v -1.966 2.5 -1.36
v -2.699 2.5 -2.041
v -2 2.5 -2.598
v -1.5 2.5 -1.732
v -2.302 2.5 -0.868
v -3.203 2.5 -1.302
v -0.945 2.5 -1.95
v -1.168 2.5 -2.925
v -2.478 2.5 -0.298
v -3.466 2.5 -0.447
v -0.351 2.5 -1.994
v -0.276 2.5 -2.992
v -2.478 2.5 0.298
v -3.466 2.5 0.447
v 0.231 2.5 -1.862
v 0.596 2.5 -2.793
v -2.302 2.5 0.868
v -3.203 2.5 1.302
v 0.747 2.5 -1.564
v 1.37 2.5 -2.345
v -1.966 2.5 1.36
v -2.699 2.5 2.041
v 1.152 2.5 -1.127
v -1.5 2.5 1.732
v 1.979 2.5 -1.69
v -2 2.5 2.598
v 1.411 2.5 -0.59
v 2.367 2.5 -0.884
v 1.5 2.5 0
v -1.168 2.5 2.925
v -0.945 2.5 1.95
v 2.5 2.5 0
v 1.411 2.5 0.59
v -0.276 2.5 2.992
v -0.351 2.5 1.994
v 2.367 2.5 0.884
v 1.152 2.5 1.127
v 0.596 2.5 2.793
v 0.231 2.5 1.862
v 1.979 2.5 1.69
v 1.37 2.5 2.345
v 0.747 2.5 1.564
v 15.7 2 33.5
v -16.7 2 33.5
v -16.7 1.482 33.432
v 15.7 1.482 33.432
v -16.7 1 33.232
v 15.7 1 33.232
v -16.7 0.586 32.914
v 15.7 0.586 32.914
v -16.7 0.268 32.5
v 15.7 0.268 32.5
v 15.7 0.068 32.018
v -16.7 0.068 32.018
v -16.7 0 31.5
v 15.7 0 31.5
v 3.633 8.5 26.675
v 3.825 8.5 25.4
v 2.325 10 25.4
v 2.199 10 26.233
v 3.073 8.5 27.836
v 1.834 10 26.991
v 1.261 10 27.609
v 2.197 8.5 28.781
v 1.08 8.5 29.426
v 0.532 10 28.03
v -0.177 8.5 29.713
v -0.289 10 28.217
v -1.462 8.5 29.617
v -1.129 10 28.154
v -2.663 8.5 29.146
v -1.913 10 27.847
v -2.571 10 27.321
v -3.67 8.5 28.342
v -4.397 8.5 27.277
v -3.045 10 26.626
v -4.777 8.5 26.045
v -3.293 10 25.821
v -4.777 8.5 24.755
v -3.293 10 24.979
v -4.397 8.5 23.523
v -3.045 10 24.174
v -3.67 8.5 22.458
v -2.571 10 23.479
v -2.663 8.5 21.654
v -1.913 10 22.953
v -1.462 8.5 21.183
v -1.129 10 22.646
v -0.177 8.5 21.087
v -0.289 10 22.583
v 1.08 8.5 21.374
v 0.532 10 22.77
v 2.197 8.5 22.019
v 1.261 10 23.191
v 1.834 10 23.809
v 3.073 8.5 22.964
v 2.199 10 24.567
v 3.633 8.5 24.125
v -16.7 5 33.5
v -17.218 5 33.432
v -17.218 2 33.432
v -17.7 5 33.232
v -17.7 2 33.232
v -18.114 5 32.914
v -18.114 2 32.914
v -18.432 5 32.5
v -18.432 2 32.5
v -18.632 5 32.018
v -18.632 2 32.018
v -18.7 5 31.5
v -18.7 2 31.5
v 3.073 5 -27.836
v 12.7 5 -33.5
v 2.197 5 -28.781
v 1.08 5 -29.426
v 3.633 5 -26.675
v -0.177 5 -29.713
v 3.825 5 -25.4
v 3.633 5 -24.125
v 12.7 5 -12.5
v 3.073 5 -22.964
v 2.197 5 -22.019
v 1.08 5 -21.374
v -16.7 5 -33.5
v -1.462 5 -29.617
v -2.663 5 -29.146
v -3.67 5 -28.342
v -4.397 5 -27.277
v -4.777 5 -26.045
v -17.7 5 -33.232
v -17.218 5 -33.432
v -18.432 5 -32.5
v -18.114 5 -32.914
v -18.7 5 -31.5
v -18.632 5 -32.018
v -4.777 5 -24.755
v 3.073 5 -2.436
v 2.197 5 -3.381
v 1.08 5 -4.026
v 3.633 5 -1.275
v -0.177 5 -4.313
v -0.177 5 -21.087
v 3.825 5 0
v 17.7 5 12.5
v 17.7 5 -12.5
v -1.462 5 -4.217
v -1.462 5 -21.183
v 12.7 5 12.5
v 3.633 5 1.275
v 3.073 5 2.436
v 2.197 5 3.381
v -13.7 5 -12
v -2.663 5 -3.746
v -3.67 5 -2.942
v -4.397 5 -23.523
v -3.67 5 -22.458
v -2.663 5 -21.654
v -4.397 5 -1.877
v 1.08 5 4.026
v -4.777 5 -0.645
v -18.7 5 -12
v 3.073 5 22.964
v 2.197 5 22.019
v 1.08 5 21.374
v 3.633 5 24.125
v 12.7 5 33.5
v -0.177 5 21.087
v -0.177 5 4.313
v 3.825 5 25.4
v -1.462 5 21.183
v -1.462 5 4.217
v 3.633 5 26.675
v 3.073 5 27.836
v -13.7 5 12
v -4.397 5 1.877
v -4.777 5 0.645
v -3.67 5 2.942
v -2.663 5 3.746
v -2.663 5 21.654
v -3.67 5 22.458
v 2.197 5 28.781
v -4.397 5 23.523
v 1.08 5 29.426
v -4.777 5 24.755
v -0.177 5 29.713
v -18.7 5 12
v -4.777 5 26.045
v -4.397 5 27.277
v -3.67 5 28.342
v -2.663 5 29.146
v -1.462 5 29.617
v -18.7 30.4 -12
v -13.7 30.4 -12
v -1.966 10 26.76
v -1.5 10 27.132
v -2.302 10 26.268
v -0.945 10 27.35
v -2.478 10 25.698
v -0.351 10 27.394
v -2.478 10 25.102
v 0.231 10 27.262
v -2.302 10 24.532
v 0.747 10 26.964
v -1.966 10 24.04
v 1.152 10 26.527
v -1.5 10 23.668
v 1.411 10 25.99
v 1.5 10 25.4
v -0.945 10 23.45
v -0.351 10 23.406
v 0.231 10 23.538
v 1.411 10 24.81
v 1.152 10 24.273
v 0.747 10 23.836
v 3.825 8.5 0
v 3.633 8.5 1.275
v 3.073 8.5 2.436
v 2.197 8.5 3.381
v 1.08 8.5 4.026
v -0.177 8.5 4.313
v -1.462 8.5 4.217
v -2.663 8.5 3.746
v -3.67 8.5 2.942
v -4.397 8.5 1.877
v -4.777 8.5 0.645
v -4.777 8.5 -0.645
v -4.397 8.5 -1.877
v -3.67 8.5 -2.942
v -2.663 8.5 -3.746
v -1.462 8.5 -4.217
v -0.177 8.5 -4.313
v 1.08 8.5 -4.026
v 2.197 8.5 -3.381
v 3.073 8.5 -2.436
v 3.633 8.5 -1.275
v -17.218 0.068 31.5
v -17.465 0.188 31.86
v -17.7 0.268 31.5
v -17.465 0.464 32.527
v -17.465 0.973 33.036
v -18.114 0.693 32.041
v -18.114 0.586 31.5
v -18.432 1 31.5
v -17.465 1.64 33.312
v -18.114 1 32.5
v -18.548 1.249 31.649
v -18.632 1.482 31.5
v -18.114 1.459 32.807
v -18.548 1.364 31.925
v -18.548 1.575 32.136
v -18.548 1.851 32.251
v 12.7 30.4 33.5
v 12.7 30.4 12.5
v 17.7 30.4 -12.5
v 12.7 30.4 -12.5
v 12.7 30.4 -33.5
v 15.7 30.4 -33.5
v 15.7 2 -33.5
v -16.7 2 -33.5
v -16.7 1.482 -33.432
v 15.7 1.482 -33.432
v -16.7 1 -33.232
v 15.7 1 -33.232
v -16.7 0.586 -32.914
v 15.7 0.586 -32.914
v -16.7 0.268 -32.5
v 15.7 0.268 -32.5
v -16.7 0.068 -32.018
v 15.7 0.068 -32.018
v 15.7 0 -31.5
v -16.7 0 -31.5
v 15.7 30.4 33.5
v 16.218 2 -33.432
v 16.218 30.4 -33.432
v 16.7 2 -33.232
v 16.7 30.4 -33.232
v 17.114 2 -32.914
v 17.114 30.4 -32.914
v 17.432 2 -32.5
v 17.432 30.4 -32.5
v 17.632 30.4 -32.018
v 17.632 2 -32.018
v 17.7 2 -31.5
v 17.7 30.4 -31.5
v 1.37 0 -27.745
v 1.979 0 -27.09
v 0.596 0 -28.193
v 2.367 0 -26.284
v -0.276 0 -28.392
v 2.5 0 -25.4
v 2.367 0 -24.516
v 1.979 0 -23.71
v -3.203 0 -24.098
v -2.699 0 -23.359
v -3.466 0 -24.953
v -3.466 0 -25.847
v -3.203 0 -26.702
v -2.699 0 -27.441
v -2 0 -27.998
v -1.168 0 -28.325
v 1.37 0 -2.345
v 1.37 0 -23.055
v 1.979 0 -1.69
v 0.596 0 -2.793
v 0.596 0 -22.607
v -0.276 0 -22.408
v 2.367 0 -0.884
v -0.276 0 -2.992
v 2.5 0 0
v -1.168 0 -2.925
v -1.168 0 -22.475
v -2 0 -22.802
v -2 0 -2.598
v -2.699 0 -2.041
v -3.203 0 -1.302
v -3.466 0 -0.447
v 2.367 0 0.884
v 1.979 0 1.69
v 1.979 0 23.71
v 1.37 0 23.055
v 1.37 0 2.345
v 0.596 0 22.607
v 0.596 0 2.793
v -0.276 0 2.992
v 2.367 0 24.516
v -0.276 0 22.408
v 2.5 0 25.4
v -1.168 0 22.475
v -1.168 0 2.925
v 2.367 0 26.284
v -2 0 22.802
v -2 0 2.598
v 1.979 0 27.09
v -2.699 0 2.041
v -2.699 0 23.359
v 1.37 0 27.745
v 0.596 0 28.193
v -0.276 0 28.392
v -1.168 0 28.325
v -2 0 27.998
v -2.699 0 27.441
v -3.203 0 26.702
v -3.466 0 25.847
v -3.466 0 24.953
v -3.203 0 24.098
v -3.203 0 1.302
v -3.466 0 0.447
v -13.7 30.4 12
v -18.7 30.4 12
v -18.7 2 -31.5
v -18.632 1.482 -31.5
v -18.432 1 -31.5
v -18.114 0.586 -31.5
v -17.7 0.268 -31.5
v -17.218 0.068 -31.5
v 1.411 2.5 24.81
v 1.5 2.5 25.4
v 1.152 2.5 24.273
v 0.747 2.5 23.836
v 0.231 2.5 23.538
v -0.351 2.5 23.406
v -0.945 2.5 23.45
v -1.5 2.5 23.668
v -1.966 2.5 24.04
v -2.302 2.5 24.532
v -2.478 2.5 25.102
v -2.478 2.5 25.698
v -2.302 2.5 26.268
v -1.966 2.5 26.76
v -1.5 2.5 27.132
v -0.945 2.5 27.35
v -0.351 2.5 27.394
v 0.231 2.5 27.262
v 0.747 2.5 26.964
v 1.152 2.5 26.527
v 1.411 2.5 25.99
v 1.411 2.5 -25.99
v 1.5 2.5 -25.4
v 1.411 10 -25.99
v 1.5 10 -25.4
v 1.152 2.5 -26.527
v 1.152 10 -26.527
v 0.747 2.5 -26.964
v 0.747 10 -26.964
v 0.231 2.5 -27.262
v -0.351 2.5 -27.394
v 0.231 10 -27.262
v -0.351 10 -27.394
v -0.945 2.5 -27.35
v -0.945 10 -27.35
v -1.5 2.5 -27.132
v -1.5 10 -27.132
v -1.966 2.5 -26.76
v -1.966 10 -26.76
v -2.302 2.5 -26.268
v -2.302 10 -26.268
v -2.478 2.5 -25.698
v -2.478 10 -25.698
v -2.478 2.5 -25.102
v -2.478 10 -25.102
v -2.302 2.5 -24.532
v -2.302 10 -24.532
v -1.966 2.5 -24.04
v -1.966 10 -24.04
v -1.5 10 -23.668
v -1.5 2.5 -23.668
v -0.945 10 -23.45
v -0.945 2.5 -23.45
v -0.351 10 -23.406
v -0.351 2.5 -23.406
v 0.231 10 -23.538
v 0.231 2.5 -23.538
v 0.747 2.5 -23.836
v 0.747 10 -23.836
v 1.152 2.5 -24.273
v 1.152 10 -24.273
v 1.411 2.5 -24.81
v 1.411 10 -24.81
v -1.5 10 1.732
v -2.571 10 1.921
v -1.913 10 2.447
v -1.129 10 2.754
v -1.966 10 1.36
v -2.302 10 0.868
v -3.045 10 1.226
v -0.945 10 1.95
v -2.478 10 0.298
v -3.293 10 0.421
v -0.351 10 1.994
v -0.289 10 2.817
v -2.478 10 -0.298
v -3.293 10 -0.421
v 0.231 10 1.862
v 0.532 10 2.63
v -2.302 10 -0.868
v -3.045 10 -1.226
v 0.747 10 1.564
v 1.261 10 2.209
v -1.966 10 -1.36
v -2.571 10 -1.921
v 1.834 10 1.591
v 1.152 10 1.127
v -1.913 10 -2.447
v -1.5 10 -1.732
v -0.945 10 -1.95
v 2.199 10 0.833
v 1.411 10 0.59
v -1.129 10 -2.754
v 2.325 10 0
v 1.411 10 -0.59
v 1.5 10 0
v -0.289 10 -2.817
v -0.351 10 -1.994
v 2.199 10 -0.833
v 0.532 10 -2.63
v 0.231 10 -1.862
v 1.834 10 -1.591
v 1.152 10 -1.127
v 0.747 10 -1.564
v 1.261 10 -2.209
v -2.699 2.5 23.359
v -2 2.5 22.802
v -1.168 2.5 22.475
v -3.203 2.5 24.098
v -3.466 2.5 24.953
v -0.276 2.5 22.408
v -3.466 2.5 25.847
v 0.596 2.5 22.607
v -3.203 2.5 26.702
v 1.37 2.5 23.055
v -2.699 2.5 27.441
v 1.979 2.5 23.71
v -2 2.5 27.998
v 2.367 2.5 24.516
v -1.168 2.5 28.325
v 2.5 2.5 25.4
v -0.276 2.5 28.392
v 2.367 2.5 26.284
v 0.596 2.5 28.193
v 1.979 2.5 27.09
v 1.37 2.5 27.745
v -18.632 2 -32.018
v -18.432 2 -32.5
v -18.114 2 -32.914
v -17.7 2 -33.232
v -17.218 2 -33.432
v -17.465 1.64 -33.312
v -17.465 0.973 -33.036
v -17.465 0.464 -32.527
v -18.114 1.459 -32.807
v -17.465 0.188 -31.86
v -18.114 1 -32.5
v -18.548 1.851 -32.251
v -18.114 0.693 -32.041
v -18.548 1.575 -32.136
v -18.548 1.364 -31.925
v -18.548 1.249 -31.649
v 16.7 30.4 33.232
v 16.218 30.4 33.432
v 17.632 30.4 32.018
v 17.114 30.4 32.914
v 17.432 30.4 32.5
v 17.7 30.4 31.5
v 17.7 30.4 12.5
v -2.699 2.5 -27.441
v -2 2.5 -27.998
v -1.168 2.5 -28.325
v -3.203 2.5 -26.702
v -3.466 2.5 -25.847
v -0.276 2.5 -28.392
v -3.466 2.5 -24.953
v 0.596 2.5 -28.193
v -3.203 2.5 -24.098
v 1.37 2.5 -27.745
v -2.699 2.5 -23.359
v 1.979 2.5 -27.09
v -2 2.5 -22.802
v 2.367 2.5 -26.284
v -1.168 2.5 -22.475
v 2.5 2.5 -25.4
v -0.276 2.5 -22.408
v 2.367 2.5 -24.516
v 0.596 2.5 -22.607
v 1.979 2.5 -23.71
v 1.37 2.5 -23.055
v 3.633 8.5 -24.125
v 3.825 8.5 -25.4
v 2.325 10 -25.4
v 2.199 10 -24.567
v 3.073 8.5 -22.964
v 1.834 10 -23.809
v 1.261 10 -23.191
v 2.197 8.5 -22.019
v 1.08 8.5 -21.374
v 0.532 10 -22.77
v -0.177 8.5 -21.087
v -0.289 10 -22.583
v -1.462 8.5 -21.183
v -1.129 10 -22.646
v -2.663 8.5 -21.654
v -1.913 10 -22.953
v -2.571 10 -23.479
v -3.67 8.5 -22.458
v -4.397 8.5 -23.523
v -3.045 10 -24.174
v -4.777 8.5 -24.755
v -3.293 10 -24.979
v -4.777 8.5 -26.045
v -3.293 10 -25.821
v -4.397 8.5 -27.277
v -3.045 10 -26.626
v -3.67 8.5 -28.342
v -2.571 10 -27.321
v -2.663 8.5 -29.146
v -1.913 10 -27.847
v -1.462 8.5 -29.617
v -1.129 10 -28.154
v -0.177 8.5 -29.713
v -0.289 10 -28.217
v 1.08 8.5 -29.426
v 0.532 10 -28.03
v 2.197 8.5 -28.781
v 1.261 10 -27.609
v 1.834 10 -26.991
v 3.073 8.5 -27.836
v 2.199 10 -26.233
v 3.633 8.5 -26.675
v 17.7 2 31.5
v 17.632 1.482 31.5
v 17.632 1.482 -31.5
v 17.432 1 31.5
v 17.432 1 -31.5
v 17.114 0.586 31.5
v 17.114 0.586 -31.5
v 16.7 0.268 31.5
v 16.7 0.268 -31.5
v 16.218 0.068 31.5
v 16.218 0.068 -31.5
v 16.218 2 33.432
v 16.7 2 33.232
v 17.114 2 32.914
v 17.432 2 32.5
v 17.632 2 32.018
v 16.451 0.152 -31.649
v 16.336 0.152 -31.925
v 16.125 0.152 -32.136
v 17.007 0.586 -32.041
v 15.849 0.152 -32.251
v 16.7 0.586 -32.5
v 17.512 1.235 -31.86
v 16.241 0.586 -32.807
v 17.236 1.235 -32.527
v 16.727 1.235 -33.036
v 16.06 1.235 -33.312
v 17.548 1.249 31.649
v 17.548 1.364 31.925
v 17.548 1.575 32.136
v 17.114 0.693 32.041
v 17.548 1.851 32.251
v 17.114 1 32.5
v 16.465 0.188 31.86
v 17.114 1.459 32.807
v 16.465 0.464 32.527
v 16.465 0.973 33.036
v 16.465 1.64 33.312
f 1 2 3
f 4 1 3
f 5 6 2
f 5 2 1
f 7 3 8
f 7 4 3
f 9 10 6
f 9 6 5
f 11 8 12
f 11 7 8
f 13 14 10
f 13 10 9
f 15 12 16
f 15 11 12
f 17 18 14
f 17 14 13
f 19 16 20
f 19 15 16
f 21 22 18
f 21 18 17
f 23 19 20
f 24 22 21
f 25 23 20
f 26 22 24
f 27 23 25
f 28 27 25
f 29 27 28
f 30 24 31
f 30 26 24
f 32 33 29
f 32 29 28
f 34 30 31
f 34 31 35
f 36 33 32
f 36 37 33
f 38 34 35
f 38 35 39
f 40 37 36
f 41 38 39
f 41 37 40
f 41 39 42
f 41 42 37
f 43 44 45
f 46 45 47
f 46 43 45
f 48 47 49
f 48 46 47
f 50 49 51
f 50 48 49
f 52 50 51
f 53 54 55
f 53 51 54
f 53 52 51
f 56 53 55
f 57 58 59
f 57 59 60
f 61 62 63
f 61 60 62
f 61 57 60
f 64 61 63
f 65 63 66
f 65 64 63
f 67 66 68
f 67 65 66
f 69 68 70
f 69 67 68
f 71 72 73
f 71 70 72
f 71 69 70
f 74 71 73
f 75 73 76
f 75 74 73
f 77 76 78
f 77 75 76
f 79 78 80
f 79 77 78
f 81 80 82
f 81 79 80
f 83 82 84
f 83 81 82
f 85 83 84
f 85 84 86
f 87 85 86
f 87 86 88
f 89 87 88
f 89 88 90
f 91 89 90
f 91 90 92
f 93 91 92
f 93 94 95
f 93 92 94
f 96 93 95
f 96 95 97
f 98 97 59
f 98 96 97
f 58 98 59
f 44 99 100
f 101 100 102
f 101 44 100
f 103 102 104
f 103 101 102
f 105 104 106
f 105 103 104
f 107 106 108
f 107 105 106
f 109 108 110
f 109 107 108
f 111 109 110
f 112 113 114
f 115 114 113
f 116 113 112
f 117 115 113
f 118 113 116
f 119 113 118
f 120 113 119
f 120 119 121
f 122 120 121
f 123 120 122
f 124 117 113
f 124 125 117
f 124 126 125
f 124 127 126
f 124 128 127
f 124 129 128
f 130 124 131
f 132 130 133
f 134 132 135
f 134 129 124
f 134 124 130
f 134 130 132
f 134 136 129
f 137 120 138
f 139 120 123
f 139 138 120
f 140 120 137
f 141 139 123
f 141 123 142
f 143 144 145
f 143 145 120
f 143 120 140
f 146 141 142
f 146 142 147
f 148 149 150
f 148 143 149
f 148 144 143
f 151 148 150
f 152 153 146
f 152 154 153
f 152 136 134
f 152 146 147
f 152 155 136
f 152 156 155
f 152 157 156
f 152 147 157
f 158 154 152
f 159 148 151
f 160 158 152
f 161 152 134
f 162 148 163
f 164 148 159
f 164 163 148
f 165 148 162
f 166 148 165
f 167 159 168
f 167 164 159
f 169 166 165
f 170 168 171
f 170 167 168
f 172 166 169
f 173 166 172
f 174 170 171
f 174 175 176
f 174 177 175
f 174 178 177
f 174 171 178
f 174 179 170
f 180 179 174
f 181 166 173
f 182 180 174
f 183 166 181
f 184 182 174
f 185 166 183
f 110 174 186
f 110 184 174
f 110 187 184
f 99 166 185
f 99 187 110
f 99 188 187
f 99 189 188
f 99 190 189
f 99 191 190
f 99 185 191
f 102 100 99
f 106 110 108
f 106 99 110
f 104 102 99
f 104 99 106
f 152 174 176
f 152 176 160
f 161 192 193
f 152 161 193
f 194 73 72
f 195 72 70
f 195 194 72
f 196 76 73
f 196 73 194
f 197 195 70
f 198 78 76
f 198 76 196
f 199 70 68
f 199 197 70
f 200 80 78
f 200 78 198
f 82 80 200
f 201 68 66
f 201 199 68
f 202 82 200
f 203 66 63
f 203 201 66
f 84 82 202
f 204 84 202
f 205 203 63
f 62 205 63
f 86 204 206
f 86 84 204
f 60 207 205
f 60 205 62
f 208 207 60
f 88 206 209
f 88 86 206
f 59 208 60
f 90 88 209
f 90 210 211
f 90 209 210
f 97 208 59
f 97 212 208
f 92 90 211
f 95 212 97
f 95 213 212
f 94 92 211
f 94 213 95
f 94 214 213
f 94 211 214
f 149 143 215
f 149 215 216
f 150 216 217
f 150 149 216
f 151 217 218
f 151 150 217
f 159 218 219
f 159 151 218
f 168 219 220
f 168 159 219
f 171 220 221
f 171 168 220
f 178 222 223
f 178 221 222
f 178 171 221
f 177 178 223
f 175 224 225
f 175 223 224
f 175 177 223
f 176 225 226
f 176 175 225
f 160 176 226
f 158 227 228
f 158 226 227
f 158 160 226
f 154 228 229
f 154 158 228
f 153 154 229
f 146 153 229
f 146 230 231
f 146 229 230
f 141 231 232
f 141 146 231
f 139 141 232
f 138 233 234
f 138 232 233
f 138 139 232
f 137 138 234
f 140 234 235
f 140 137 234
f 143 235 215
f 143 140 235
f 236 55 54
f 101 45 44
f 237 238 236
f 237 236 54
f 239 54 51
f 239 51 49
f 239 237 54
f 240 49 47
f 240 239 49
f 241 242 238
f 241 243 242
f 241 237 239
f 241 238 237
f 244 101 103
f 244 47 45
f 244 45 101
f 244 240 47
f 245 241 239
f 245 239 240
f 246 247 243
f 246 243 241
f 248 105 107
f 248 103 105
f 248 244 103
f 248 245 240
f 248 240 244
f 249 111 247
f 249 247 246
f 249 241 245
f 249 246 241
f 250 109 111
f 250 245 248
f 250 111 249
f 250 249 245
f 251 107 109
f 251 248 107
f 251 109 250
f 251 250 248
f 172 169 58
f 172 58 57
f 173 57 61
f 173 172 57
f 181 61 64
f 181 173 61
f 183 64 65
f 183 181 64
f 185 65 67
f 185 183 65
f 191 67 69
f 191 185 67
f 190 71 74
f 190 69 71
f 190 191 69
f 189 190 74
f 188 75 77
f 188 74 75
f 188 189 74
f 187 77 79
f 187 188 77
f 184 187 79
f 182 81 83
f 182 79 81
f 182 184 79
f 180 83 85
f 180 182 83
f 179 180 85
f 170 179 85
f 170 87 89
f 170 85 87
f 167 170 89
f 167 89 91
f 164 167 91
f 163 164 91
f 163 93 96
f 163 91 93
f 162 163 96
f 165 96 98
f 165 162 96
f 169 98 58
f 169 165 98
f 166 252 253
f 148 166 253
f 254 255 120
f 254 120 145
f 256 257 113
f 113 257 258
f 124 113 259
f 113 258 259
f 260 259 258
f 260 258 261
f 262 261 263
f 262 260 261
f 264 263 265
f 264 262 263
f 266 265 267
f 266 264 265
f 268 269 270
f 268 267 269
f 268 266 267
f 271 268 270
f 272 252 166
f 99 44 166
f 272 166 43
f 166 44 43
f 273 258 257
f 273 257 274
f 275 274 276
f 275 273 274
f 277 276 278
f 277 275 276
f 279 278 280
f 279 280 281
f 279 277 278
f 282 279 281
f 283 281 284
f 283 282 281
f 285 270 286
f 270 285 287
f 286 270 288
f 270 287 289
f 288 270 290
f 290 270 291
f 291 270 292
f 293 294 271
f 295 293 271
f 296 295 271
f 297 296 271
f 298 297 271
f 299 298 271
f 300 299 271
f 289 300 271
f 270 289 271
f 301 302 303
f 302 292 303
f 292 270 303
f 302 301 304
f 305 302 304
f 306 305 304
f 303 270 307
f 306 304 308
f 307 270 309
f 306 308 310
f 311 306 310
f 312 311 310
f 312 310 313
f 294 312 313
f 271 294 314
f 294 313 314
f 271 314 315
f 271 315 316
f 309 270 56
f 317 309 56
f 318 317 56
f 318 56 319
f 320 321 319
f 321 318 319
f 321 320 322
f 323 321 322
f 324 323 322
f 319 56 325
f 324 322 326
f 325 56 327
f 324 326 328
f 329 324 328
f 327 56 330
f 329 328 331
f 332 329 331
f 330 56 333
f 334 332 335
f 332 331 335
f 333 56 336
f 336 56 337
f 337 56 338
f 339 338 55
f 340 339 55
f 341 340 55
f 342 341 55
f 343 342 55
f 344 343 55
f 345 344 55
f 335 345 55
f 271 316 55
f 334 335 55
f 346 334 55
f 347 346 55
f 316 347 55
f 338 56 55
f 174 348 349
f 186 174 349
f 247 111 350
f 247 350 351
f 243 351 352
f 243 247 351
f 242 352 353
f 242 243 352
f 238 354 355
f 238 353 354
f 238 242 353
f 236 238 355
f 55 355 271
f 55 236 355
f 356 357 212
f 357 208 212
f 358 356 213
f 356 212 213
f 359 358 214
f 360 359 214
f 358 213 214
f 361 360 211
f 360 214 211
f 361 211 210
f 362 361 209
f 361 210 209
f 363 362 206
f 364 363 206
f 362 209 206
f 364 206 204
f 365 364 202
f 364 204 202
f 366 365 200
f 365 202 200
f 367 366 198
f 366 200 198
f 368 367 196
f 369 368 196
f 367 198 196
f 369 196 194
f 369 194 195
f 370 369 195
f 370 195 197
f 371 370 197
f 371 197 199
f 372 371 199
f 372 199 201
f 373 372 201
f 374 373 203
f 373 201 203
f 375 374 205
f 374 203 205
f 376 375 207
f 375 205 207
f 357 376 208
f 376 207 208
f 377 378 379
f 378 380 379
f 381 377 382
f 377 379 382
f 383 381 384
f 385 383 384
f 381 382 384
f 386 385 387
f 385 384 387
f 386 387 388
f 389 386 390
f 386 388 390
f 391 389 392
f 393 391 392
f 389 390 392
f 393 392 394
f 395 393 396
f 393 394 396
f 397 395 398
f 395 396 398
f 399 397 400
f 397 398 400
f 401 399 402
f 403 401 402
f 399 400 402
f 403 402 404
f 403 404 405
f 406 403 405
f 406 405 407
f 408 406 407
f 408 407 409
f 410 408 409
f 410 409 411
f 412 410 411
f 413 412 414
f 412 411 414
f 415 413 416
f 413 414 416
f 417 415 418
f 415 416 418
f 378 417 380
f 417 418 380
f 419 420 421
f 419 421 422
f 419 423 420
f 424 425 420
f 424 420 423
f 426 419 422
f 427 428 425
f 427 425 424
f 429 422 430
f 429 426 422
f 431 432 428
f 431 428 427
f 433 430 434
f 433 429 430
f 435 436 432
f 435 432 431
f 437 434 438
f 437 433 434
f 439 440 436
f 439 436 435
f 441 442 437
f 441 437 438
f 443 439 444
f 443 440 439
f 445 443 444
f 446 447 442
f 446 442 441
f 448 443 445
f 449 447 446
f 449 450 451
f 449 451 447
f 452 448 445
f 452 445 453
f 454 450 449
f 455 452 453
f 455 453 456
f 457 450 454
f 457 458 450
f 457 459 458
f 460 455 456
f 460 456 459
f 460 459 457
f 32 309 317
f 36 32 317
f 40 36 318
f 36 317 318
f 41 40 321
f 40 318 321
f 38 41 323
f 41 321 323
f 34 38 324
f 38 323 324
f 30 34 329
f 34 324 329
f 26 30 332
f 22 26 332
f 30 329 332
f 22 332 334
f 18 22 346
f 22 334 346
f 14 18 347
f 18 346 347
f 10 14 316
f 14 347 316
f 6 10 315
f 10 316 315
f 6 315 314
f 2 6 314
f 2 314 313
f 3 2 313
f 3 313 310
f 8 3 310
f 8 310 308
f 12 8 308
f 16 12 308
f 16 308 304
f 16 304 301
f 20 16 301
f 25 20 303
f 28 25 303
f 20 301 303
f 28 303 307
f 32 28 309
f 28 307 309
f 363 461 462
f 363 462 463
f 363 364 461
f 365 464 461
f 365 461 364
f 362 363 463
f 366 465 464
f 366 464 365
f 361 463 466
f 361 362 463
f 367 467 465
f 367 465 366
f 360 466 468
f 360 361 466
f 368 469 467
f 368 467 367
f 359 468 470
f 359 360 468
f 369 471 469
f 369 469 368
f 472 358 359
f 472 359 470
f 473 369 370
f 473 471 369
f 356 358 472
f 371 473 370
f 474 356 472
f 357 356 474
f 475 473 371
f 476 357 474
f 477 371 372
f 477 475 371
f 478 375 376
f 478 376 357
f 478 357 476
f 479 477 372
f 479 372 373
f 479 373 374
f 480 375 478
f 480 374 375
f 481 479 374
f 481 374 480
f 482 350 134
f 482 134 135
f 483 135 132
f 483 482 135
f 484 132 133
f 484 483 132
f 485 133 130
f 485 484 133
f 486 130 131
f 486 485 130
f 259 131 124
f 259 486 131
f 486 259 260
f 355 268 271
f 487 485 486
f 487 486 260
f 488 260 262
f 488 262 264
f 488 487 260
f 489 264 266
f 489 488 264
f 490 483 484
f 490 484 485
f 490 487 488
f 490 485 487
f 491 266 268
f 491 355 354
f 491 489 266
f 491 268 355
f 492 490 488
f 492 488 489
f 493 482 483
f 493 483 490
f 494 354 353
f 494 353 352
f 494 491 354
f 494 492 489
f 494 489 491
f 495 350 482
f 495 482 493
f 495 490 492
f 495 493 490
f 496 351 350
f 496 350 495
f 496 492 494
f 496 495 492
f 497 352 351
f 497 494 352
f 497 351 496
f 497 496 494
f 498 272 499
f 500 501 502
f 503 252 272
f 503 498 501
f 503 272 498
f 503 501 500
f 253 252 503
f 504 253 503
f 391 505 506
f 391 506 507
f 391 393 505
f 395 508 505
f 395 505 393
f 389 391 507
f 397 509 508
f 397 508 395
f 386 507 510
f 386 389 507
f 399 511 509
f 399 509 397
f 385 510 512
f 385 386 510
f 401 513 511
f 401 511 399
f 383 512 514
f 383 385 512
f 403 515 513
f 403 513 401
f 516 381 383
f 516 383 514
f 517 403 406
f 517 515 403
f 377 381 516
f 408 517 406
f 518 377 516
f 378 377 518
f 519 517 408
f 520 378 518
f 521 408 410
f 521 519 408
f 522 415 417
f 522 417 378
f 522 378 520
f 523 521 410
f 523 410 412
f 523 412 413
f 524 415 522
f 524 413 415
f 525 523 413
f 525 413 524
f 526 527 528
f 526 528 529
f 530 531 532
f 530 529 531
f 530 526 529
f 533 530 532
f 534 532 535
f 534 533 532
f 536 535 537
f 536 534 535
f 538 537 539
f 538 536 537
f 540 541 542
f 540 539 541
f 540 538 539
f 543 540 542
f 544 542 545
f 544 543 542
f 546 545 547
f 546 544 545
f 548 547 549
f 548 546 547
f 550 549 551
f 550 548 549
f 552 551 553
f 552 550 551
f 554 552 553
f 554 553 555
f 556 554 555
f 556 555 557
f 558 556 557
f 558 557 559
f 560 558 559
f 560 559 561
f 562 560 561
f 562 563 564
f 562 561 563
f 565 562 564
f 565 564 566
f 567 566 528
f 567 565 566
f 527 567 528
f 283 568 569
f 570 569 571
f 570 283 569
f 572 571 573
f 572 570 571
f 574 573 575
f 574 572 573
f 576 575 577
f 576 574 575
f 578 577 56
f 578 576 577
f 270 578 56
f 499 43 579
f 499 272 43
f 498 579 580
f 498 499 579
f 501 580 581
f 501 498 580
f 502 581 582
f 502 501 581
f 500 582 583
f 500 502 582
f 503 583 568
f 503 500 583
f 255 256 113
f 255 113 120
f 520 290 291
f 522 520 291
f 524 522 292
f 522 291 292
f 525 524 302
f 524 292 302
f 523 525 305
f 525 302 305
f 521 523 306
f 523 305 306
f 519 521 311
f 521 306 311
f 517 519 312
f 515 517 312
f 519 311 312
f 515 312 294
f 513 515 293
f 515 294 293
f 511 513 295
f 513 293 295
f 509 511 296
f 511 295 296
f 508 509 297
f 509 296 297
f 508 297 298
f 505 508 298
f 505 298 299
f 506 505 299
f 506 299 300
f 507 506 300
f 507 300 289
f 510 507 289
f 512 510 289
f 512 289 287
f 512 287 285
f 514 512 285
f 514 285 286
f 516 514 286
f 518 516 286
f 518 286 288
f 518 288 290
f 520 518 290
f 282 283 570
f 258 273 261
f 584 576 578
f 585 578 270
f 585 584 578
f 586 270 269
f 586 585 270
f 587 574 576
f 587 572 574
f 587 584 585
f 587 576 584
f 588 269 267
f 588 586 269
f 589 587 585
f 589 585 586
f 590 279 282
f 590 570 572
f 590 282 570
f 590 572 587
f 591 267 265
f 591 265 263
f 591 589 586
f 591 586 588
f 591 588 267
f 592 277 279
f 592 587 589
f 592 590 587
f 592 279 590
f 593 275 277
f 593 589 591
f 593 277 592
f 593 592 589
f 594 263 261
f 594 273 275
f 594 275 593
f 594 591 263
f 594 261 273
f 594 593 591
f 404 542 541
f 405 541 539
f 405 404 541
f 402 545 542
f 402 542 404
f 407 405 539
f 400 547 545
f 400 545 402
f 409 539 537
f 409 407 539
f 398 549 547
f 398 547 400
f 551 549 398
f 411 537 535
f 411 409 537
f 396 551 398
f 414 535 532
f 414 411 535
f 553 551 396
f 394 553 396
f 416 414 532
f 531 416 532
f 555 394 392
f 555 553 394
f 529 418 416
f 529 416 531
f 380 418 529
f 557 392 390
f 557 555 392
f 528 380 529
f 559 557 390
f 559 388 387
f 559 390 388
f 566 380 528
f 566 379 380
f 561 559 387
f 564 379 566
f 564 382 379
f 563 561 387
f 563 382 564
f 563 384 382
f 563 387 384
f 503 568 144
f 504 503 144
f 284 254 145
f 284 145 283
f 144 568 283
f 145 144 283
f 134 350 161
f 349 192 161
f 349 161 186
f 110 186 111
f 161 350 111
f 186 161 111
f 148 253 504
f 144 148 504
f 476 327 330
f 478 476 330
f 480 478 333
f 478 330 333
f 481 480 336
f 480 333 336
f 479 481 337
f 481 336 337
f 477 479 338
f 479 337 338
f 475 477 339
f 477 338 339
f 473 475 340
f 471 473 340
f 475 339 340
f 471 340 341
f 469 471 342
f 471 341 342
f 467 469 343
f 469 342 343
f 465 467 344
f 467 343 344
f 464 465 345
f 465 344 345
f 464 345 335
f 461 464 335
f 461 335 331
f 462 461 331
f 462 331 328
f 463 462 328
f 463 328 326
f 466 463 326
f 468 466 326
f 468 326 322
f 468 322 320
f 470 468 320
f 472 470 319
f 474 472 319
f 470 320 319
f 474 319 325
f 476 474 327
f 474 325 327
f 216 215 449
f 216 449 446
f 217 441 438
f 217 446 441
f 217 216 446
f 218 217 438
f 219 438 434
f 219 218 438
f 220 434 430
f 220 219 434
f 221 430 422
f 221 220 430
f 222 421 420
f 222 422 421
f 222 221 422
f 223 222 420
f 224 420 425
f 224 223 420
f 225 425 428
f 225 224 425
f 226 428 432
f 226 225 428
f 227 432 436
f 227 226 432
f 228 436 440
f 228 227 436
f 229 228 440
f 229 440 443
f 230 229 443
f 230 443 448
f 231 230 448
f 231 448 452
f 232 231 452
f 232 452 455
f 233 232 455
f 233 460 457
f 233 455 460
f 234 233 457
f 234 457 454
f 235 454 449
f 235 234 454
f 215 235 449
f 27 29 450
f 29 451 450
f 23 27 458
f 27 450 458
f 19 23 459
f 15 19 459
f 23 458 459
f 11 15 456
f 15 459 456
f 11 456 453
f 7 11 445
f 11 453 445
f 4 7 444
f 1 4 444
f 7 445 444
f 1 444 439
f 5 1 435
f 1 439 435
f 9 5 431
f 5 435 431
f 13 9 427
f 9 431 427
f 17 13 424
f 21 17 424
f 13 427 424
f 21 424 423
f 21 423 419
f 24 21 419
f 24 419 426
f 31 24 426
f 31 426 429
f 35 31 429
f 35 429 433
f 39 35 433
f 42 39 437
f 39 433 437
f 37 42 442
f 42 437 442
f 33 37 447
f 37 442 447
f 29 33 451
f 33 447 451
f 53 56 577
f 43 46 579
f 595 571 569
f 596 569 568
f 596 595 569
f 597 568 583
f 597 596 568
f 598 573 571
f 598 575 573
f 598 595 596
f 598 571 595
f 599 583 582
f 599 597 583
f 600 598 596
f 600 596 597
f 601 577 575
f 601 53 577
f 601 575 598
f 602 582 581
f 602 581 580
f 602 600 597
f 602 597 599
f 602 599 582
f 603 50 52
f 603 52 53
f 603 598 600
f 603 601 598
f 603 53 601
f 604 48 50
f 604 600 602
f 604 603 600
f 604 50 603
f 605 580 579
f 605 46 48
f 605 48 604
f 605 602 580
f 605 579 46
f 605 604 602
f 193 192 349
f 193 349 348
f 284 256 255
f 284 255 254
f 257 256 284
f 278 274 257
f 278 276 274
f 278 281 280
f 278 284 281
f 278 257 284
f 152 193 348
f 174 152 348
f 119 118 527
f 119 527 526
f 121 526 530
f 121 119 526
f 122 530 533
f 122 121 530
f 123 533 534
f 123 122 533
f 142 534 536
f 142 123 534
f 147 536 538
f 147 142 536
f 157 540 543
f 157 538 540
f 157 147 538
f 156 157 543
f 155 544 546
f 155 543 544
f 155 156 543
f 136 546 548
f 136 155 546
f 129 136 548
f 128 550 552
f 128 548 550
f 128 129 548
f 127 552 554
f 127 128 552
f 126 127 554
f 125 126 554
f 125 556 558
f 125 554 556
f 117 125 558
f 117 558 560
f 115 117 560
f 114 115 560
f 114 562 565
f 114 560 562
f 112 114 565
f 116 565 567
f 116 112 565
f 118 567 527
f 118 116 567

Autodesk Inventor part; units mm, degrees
ref_plane "YZ Plane" through (0, 0, 0) normal (1, 0, 0) x (0, 1, 0)
ref_plane "XZ Plane" through (0, 0, 0) normal (0, 1, 0) x (-1, 0, 0)
ref_plane "XY Plane" through (0, 0, 0) normal (0, 0, 1) x (1, 0, 0)
sketch "Sketch1" plane through (0, 0, 0) normal (0, 1, 0) x (-1, 0, 0)
  line L0 (18.7, 33.5) -> (-17.7, 33.5)
  line L1 (-17.7, 33.5) -> (-17.7, -33.5)
  line L2 (-17.7, -33.5) -> (18.7, -33.5)
  line L3 (18.7, -33.5) -> (18.7, 33.5)
  point P0 (0, 0)
  dimension "d0" = 36.4
  dimension "d1" = 67
extrude "Extrusion1" add sketch "Sketch1" along normal blind 5
sketch "Sketch2" plane through (0, 5, 0) normal (0, 1, 0) x (1, 0, 0)
  line L0 (-18.7, -33.5) -> (17.7, -33.5) projected
  line L1 (17.7, -33.5) -> (12.7, -33.5)
  line L2 (12.7, -33.5) -> (12.7, -12.5)
  line L3 (12.7, -12.5) -> (17.7, -12.5)
  line L4 (17.7, -12.5) -> (17.7, -33.5)
  line L5 (17.7, -33.5) -> (17.7, 33.5) projected
  line L6 (17.7, 33.5) -> (12.7, 33.5)
  line L7 (12.7, 33.5) -> (12.7, 12.5)
  line L8 (12.7, 12.5) -> (17.7, 12.5)
  line L9 (17.7, 12.5) -> (17.7, 33.5)
  point P0 (0, 0)
  dimension "d4" = 5
  dimension "d5" = 21
  dimension "d6" = 5
  dimension "d7" = 21
extrude "Extrusion2" add sketch "Sketch2" along normal blind 25.4
fillet "Fillet2" radius 2 6 edges at (-0.5, 0, 33.5) (-18.7, 0, 0) (17.7, 15.2, 33.5) (17.7, 15.2, -33.5) (-0.5, 0, -33.5) (17.7, 0, 0)
sketch "Sketch6" plane through (0, 5, 0) normal (0, 1, 0) x (1, 0, 0)
  line L0 (-18.7, -33.5) -> (-18.7, 33.5) projected
  line L1 (-18.7, 12) -> (-13.7, 12)
  line L2 (-13.7, 12) -> (-13.7, -12)
  line L3 (-13.7, -12) -> (-18.7, -12)
  line L4 (-18.7, -12) -> (-18.7, 12)
  point P0 (0, 0)
  point P1 (-18.7, -12)
  dimension "d26" = 5
  dimension "d27" = 24
extrude "Extrusion6" add sketch "Sketch6" along normal blind 25.4
fillet "Fillet3" radius 2 4 edges at (-18.1142, 0.5858, 32.9142) (-18.7, 3.5, 33.5) (-18.1142, 0.5858, -32.9142) (-18.7, 3.5, -33.5)
sketch "Sketch8" plane through (0, 5, 0) normal (0, 1, 0) x (1, 0, 0)
  circle A0 centre (-0.5, 0) radius 4.325
  circle A1 centre (-0.5, -25.4) radius 4.325
  circle A2 centre (-0.5, 25.4) radius 4.325
  point P0 (0, 0)
  dimension "d37" = 8.65
  dimension "d38" = 8.65
  dimension "d39" = 8.65
extrude "Extrusion8" add sketch "Sketch8" along normal blind 5
chamfer "Chamfer1" distance 1.5 angle 45 3 edges at (-4.825, 10, 0) (-4.825, 10, -25.4) (-4.825, 10, 25.4)
sketch "Sketch9" plane through (-0.5, 10, 0) normal (0, 1, 0) x (1, 0, 0)
  circle A0 centre (0, 0) radius 2.825 projected
  circle A1 centre (0, 0) radius 2
  circle A2 centre (0, 25.4) radius 2.825 projected
  circle A3 centre (0, 25.4) radius 2
  circle A4 centre (0, -25.4) radius 2.825 projected
  circle A5 centre (0, -25.4) radius 2
  point P0 (0.5, 0)
  dimension "d45" = 4
  dimension "d46" = 4
  dimension "d47" = 4
extrude "Extrusion9" cut sketch "Sketch9" against normal blind 20 contours A1 | A3 | A5
sketch "Sketch10" plane through (0, 0, 0) normal (0, -1, 0) x (1, 0, 0)
  circle A0 centre (-0.5, -25.4) radius 2.825 projected
  circle A1 centre (-0.5, -25.4) radius 3
  circle A2 centre (-0.5, 0) radius 4.325 projected
  circle A3 centre (-0.5, 0) radius 3
  circle A4 centre (-0.5, 25.4) radius 2.825 projected
  circle A5 centre (-0.5, 25.4) radius 3
  point P0 (0, 0)
  dimension "d50" = 6
  dimension "d51" = 6
  dimension "d52" = 6
extrude "Extrusion10" cut sketch "Sketch10" against normal blind 2.5 contours A0 | A1 | A3 | A4 | A5
properties part number "3Wide5mm"
